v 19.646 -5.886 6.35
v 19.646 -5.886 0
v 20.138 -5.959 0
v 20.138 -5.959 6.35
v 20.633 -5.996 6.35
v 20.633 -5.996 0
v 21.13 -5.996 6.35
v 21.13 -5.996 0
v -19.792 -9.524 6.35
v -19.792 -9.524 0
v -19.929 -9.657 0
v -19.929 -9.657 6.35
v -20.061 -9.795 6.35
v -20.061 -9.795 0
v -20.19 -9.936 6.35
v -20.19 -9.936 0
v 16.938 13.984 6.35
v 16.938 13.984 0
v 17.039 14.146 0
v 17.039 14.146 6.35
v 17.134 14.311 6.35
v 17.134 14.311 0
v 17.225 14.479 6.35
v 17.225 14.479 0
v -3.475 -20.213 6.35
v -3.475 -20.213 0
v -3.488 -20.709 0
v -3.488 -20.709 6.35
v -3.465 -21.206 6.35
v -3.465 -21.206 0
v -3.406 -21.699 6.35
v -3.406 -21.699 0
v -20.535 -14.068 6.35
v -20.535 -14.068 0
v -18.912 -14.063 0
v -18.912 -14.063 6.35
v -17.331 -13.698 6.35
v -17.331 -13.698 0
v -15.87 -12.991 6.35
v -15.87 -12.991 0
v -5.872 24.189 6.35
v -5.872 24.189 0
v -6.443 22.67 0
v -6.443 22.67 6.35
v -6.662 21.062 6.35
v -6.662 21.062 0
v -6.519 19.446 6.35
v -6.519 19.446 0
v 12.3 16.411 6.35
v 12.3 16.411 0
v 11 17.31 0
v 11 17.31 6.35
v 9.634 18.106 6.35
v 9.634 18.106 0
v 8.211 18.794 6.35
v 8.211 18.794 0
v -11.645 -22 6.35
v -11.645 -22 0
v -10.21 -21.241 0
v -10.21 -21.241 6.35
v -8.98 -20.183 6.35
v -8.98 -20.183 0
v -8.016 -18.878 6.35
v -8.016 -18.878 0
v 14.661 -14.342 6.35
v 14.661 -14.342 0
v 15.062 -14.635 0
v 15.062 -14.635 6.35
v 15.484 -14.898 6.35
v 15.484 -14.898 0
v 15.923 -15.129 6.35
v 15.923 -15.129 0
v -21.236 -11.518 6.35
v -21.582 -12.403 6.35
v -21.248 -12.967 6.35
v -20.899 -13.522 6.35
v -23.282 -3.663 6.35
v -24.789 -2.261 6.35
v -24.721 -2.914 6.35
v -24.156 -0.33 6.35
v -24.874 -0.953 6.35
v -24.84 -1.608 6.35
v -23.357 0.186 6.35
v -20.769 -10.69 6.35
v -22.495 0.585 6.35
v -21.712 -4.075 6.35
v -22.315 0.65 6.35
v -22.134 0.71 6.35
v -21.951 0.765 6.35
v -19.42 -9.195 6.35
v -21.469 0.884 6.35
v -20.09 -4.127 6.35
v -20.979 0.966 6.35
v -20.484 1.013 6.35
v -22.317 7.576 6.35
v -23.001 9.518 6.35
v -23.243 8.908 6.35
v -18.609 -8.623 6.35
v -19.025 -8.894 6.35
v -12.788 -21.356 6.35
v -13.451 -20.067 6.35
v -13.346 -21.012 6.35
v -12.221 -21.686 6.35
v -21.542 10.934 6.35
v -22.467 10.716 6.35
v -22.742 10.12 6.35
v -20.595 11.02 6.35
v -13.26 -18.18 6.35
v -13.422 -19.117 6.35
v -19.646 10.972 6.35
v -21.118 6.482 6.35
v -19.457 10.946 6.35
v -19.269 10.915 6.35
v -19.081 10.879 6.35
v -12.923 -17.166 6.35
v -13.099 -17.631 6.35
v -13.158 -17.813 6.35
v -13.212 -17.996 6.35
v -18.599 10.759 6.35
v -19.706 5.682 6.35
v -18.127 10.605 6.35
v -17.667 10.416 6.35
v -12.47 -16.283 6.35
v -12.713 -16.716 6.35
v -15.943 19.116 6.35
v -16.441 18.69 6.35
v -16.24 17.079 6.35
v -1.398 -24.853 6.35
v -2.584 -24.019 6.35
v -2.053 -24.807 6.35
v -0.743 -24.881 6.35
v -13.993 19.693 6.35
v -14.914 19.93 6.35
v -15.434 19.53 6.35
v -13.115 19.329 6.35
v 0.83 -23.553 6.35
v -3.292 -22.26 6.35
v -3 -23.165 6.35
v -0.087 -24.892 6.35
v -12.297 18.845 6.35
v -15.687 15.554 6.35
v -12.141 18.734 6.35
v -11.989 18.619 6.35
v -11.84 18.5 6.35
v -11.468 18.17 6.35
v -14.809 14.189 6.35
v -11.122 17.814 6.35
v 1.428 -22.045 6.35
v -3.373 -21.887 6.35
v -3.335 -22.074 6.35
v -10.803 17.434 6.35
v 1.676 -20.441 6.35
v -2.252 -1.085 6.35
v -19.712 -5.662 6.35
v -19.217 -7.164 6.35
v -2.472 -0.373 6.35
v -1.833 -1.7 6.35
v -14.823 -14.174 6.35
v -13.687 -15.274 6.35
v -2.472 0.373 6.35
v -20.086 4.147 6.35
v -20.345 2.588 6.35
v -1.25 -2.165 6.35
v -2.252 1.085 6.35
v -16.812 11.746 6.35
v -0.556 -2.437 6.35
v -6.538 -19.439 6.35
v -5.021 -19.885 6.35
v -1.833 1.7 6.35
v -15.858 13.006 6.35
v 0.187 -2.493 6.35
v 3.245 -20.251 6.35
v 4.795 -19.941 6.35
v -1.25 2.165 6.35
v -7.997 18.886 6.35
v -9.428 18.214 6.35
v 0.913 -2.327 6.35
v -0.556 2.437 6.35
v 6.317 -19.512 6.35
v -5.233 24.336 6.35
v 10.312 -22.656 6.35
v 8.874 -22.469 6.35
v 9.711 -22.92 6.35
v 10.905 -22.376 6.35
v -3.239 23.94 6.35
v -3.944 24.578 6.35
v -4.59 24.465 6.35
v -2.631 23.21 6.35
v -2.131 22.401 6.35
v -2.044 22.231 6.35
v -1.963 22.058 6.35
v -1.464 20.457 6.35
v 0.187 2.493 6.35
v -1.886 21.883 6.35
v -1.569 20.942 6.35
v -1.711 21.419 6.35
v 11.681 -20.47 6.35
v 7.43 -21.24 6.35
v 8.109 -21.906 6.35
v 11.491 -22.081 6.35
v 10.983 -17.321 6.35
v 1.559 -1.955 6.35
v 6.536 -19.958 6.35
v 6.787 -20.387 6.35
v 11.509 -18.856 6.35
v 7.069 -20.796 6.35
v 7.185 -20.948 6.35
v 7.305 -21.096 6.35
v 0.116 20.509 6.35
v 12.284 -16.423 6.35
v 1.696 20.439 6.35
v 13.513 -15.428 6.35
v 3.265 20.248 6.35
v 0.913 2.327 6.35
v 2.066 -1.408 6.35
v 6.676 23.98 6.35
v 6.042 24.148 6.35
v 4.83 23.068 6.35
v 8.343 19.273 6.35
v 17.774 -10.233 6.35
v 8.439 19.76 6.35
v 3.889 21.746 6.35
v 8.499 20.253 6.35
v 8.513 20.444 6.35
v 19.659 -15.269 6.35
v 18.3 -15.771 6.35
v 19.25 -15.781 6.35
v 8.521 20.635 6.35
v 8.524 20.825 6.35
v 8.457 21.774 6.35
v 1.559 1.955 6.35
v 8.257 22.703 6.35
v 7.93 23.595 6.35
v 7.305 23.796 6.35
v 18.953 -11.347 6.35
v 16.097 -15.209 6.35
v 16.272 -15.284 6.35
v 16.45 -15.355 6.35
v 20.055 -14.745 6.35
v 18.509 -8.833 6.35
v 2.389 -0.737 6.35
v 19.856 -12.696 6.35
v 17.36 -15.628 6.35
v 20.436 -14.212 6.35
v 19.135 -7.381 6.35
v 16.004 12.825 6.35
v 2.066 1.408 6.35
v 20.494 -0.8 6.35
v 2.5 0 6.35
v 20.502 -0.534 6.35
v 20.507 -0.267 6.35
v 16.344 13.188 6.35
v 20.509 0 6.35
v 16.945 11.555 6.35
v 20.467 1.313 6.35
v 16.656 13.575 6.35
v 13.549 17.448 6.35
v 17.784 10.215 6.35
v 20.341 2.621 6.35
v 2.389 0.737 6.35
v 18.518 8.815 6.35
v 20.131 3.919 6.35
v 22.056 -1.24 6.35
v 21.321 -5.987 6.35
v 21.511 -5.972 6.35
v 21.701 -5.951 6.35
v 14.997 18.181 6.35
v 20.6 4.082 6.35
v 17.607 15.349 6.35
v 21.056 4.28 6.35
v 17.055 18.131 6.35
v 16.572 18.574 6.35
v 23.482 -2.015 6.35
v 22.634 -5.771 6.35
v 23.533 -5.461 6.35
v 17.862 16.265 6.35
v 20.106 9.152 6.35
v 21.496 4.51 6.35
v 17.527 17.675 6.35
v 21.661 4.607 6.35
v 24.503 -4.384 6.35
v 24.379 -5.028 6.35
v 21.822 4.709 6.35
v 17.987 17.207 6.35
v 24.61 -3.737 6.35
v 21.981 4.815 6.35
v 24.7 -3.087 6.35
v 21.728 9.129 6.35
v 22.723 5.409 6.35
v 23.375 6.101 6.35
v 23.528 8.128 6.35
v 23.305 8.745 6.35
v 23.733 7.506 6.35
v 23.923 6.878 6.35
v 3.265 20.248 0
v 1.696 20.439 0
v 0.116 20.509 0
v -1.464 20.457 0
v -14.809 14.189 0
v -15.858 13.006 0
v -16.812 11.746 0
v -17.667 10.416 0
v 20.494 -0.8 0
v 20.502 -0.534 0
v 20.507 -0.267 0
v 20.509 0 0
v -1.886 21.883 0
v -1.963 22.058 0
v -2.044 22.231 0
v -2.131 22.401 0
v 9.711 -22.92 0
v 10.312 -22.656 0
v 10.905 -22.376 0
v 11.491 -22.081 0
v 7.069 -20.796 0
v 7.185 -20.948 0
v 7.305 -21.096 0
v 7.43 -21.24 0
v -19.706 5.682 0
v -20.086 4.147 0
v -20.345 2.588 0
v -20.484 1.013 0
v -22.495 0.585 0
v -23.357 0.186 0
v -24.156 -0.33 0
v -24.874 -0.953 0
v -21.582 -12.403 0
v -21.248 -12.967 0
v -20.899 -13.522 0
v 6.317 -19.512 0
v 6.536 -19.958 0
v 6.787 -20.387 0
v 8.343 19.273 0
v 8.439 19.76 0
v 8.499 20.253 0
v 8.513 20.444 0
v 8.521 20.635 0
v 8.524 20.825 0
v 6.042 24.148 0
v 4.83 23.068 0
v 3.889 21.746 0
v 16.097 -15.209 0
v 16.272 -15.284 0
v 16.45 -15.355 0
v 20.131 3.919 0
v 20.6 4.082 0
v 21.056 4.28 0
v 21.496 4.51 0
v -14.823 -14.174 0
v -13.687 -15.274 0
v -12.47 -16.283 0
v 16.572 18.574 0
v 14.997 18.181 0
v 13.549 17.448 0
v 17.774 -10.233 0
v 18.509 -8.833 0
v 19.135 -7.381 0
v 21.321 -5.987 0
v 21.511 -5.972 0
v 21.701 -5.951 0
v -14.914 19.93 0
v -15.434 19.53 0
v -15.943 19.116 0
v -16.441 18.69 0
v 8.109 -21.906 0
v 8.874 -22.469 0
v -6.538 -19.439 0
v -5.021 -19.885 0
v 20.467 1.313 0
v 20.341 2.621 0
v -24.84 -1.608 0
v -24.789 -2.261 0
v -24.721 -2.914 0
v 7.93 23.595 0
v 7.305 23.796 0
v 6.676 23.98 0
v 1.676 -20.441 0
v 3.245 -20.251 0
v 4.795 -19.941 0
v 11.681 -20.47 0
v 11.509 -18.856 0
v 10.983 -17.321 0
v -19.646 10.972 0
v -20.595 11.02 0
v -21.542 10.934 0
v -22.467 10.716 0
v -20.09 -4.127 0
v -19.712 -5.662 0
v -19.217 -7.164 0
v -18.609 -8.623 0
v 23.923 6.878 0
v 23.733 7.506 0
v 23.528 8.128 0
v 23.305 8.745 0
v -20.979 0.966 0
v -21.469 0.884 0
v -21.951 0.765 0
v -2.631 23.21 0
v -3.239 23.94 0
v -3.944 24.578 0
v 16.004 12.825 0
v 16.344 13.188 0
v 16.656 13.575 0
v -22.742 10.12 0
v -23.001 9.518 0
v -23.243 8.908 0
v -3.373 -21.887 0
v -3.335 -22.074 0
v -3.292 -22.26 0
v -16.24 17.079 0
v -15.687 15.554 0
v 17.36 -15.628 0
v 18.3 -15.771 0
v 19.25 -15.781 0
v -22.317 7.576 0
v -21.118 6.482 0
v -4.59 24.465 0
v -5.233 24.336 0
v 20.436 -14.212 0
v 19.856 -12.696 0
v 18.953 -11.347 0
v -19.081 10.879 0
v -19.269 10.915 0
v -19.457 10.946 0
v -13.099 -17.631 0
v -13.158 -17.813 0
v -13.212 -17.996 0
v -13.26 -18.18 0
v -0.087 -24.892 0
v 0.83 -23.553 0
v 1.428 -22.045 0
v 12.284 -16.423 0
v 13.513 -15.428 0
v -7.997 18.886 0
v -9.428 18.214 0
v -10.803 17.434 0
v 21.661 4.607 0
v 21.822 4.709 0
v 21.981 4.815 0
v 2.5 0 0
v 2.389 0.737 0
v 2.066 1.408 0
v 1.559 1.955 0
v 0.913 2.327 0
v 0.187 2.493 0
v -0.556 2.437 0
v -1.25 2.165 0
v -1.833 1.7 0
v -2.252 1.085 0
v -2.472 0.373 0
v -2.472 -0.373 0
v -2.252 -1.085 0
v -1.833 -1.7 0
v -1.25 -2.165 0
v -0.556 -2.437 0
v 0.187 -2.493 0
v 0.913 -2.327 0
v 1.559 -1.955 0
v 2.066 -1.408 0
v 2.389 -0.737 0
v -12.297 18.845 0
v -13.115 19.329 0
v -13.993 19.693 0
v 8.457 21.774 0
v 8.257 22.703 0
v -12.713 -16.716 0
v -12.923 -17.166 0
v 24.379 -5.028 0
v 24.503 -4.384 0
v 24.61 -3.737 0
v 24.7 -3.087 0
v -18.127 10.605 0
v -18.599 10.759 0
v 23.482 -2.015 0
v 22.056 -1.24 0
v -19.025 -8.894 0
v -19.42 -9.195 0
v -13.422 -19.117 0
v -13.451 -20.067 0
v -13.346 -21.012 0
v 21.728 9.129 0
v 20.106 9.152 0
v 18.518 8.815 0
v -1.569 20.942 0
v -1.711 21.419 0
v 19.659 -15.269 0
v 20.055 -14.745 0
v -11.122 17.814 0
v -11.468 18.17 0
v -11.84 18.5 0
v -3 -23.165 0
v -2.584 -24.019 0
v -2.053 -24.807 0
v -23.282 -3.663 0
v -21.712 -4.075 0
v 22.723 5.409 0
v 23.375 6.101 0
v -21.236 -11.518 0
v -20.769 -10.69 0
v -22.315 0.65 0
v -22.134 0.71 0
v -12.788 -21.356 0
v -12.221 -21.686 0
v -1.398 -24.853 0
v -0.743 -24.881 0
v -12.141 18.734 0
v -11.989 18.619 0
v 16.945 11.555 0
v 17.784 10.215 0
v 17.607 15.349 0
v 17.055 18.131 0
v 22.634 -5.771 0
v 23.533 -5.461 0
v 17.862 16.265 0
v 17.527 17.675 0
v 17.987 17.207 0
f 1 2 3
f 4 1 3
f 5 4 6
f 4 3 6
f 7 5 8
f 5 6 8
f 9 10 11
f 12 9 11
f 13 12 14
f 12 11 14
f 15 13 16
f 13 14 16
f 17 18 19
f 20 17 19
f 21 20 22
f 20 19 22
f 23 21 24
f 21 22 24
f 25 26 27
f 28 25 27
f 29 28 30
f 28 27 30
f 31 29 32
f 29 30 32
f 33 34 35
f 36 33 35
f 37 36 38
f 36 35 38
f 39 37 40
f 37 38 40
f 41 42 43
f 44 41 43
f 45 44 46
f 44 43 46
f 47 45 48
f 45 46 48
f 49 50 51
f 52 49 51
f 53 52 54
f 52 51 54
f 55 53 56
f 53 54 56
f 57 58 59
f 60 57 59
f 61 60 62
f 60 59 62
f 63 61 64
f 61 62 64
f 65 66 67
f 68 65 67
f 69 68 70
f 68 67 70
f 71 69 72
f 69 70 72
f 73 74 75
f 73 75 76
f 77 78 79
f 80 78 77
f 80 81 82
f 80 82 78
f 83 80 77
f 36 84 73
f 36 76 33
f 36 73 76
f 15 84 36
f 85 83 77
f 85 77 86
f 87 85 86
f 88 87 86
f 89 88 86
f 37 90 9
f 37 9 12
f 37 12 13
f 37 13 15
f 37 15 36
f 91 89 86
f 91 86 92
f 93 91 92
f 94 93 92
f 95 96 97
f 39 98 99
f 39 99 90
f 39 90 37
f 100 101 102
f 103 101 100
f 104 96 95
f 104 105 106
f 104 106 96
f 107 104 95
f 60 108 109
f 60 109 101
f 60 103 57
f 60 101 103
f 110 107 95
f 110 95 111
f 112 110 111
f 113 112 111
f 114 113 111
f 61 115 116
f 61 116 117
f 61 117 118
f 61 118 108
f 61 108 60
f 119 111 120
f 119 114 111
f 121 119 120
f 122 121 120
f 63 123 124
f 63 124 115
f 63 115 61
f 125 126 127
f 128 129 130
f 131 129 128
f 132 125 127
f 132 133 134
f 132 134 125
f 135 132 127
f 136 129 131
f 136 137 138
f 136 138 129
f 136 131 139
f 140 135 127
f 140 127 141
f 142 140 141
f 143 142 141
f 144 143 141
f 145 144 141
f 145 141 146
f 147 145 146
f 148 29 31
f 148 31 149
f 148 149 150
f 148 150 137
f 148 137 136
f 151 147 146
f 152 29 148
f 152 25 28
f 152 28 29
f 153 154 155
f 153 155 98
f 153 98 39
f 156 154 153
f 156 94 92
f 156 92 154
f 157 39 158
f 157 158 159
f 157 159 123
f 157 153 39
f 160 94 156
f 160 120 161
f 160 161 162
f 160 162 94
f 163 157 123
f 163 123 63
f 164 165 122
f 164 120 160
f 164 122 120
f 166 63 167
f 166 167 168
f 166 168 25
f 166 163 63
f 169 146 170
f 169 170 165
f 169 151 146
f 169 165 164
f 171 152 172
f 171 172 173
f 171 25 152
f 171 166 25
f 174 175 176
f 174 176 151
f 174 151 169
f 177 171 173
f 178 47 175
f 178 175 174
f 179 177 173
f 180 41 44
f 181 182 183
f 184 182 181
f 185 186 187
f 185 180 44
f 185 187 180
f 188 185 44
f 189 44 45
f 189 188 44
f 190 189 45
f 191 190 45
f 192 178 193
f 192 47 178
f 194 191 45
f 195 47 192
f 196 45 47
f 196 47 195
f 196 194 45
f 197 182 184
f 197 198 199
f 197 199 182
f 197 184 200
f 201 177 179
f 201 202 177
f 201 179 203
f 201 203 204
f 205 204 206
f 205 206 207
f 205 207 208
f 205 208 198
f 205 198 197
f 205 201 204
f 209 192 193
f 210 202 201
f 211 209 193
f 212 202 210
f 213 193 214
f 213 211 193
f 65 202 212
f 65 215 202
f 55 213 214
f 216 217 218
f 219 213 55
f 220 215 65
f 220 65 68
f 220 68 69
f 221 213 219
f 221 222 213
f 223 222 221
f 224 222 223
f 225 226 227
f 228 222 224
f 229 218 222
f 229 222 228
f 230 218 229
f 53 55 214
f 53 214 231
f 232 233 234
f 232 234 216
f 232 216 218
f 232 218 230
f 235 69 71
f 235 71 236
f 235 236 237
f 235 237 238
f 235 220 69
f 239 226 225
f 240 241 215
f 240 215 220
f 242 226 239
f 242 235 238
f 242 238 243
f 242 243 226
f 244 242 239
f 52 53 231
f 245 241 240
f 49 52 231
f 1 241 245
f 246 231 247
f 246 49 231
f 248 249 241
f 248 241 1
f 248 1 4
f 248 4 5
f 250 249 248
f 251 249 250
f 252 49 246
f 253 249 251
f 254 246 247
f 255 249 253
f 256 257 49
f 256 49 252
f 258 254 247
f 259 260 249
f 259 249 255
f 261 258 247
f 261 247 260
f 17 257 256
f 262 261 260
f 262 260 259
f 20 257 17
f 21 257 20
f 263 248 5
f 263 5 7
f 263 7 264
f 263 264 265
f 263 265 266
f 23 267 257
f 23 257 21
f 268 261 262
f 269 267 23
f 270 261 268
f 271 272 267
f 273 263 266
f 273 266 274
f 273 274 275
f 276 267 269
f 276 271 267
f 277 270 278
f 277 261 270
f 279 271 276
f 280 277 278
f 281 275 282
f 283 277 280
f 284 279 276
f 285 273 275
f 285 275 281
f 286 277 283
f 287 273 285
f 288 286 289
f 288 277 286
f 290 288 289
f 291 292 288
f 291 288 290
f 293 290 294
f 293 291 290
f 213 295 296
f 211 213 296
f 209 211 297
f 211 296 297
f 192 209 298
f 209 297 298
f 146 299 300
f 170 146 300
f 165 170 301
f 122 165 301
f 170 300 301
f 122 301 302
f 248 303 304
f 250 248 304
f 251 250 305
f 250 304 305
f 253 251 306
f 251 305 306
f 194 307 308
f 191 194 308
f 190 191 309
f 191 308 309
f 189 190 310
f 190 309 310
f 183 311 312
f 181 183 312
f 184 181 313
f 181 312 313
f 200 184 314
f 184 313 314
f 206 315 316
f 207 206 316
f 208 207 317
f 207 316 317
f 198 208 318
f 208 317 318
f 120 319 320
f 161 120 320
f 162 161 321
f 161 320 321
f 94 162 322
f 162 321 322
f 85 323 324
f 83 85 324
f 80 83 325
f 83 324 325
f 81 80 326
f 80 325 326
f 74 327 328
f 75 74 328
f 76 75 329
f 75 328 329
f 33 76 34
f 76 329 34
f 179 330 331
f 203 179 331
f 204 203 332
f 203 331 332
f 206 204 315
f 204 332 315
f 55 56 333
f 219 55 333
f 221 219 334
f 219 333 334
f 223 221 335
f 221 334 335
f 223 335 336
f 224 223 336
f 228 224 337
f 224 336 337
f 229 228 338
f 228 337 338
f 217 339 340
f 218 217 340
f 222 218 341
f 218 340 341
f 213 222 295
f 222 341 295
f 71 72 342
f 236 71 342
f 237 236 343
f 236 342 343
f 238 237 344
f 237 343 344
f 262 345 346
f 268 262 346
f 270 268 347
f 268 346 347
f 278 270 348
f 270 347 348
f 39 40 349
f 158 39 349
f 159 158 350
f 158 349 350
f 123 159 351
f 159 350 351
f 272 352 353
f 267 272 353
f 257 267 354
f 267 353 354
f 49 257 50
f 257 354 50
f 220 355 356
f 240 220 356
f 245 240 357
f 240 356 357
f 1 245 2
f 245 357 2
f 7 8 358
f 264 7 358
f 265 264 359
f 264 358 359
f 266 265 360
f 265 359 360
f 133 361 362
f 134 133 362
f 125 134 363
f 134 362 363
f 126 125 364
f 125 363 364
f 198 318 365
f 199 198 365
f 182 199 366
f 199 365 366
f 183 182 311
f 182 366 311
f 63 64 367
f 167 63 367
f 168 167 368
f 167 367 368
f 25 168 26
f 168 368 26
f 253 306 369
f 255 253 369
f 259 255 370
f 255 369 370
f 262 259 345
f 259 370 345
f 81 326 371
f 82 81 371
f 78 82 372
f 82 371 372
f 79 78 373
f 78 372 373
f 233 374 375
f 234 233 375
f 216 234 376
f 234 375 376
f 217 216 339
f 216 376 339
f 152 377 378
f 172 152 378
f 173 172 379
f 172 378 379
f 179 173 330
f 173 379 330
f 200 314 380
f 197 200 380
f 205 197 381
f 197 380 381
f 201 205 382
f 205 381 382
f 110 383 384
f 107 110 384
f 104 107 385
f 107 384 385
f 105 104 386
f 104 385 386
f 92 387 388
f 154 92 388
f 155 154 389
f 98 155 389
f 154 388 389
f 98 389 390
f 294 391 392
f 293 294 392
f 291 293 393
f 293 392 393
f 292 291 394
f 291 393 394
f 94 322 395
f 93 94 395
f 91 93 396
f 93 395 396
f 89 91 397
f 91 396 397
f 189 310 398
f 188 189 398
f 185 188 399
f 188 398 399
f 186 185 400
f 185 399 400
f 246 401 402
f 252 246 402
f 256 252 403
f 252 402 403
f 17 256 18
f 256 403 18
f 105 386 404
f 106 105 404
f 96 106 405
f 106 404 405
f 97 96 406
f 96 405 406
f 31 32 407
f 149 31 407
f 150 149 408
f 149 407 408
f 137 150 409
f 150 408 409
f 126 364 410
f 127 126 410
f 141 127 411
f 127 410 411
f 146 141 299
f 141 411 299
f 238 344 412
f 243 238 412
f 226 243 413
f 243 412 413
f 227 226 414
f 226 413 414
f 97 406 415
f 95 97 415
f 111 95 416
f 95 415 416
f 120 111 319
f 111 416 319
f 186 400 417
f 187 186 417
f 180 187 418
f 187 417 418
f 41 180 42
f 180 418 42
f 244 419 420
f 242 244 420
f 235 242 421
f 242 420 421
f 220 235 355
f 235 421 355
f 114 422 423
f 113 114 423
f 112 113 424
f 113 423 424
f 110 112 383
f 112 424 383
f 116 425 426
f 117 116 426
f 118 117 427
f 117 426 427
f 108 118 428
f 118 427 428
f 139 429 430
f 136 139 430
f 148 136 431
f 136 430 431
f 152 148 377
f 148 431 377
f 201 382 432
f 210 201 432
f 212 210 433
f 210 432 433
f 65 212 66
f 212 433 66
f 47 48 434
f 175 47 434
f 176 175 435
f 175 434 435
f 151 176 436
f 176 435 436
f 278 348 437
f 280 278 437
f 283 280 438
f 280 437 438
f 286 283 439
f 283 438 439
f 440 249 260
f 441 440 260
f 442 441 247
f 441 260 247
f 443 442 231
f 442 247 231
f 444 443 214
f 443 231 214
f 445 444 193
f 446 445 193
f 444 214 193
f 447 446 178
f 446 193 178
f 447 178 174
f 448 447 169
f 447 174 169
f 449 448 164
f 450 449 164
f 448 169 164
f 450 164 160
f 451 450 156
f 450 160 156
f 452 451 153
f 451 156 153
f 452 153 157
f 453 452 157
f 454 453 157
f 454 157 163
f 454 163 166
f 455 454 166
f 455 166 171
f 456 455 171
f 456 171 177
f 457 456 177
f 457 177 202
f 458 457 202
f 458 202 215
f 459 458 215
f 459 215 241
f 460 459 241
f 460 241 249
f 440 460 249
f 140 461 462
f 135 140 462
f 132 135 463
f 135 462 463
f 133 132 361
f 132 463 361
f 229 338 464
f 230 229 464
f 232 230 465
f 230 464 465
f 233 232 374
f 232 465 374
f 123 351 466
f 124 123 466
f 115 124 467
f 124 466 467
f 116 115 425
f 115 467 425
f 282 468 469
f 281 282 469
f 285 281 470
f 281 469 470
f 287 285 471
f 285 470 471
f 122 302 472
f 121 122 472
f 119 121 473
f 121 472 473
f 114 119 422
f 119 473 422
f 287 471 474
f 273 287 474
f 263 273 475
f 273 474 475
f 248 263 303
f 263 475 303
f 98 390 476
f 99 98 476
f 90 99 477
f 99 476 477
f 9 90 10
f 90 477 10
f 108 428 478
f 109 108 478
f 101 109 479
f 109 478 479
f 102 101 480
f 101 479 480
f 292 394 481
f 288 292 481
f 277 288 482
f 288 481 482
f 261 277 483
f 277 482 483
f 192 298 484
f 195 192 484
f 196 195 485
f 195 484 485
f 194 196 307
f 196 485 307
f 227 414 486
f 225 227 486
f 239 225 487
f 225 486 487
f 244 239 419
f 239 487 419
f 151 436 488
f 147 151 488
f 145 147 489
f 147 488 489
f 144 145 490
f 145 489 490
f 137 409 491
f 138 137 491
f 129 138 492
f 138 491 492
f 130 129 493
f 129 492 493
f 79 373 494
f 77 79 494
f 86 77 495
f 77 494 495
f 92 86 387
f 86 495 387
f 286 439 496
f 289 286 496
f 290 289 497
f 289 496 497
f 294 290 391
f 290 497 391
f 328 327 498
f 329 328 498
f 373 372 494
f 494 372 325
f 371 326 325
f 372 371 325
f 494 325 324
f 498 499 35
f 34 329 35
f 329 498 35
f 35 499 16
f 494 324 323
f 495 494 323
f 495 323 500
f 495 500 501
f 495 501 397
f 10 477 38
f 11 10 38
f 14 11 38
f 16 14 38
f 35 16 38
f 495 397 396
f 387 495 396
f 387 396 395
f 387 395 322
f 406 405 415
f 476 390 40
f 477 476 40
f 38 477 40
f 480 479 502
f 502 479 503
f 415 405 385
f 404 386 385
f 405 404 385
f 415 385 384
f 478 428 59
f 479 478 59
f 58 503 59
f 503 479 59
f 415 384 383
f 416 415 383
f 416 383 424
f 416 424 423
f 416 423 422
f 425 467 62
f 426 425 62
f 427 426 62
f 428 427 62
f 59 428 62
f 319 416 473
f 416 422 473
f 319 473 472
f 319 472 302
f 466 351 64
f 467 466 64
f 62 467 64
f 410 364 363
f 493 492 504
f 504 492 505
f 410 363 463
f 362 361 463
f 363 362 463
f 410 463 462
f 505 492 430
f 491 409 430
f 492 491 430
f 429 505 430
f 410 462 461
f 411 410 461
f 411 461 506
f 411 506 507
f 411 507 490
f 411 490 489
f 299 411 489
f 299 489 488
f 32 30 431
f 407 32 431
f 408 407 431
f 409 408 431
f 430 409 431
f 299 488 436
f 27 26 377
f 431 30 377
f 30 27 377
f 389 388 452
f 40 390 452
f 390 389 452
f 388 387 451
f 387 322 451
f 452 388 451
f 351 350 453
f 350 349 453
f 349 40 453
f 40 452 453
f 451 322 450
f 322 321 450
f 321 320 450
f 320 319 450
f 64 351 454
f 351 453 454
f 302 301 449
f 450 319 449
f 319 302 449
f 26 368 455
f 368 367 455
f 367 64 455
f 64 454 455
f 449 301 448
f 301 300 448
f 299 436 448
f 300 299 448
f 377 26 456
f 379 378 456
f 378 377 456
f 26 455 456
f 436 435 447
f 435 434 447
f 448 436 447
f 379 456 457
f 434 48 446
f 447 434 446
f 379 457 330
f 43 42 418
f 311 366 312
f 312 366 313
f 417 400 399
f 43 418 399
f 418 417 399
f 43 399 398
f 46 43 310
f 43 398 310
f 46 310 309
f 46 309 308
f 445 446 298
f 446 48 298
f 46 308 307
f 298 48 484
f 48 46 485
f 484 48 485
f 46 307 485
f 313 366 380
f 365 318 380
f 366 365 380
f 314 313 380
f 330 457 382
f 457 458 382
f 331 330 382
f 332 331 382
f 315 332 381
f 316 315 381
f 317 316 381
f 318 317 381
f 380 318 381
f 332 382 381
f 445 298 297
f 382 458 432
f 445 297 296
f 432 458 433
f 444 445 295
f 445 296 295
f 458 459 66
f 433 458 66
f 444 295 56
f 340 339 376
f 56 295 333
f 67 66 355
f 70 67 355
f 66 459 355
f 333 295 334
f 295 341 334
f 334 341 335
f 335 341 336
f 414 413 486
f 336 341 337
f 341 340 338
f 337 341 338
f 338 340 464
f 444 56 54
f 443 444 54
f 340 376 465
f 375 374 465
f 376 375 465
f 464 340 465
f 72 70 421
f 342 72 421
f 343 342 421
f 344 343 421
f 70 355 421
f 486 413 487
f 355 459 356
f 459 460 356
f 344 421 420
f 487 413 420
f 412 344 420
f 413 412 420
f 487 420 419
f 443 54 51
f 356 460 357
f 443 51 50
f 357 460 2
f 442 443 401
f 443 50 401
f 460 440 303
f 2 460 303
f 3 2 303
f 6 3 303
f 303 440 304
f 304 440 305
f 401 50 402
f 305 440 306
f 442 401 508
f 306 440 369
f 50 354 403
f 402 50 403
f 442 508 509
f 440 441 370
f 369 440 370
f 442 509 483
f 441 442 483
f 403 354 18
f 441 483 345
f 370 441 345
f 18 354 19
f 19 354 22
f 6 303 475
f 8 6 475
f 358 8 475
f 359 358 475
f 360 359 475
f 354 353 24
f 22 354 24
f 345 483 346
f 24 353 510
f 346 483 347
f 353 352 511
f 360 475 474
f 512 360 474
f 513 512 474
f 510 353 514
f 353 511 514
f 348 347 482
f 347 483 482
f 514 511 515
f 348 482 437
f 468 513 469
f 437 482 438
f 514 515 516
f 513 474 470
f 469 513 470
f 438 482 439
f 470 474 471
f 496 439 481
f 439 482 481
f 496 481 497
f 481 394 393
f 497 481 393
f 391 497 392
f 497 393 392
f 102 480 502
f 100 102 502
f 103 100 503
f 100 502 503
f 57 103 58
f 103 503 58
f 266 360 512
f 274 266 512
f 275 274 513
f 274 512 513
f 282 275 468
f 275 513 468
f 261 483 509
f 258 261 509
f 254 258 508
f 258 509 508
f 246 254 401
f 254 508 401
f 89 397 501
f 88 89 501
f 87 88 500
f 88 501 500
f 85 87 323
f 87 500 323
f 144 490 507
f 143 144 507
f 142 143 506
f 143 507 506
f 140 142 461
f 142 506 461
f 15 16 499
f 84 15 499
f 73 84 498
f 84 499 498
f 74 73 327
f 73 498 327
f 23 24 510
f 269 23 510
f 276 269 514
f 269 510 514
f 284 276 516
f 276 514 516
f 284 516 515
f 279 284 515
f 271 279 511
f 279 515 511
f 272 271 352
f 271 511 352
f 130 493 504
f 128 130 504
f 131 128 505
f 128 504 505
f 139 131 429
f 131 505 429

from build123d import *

# Parameters (mm, degrees)
F1_DEPTH = 6.35
F2_COUNT = 13
F3_R     = 2.5
F4_DEPTH = 25.4


with BuildPart() as f1:
    # F0 (on Top) → F1 (new body)
    with BuildSketch(Plane.XY):
        with BuildLine():
            ThreePointArc((7.9296197565, 23.5951858335), (6.9911317973, 23.8900761864), (6.0417249702, 24.1476546146))
            ThreePointArc((6.0417249702, 24.1476546146), (4.3226425573, 22.4330749308), (3.2648662162, 20.2476374354))
            ThreePointArc((3.2648662162, 20.2476374354), (5.7837443287, 19.6767495961), (8.2108987358, 18.7938105523))
            ThreePointArc((8.2108987358, 18.7938105523), (8.3954934616, 19.5156536929), (8.4994507341, 20.2534379554))
            ThreePointArc((8.4994507341, 20.2534379554), (8.5176465567, 20.5391701676), (8.5237154667, 20.8254168329))
            ThreePointArc((8.5237154667, 20.8254168329), (8.373521449, 22.2418004346), (7.9296197565, 23.5951858335))
        make_face()
        with BuildLine():
            ThreePointArc((4.0264902572, 14.4598933509), (-1.7431476836, 15.057566034), (-4.9211585336, 19.9100068261))
            ThreePointArc((-4.9211585336, 19.9100068261), (-12.6431262329, -16.1486077476), (20.5091729021, 0))
            ThreePointArc((20.5091729021, 0), (19.2415803806, 7.0984334598), (15.5954927821, 13.3194135761))
            ThreePointArc((15.5954927821, 13.3194135761), (9.5256046991, 10.9946956396), (4.0264902572, 14.4598933509))
        make_face()
        with BuildLine():
            ThreePointArc((3.2648662162, 20.2476374354), (-0.8451772993, 20.4917507417), (-4.9211585336, 19.9100068261))
            ThreePointArc((-4.9211585336, 19.9100068261), (-1.7431476836, 15.057566034), (4.0264902572, 14.4598933509))
            ThreePointArc((4.0264902572, 14.4598933509), (3.0384725246, 17.2738616412), (3.2648662162, 20.2476374354))
        make_face()
        with BuildLine():
            ThreePointArc((4.0264902572, 14.4598933509), (9.5256046991, 10.9946956396), (15.5954927821, 13.3194135761))
            ThreePointArc((15.5954927821, 13.3194135761), (12.2138579016, 16.4756744411), (8.2108987358, 18.7938105523))
            ThreePointArc((8.2108987358, 18.7938105523), (6.6287005247, 16.1344397874), (4.0264902572, 14.4598933509))
        make_face()
        with BuildLine():
            ThreePointArc((8.2108987358, 18.7938105523), (5.7837443287, 19.6767495961), (3.2648662162, 20.2476374354))
            ThreePointArc((3.2648662162, 20.2476374354), (3.0384725246, 17.2738616412), (4.0264902572, 14.4598933509))
            ThreePointArc((4.0264902572, 14.4598933509), (6.6287005247, 16.1344397874), (8.2108987358, 18.7938105523))
        make_face()
    extrude(amount=F1_DEPTH)

    # F2: F1 ×13 about axis
    f2_axis = Axis((0, 0, 6.35), (0, 0, 1))


with BuildPart() as f1_1:
    add(f1.part)
    for i in range(1, F2_COUNT):
        add(f1.part.rotate(f2_axis, i * 360 / F2_COUNT))

    # F3 (on face) → F4 (cut)
    with BuildSketch(Plane.XY.offset(6.35)):
        Circle(F3_R)
    extrude(amount=-F4_DEPTH, mode=Mode.SUBTRACT)


solid = f1_1.part
